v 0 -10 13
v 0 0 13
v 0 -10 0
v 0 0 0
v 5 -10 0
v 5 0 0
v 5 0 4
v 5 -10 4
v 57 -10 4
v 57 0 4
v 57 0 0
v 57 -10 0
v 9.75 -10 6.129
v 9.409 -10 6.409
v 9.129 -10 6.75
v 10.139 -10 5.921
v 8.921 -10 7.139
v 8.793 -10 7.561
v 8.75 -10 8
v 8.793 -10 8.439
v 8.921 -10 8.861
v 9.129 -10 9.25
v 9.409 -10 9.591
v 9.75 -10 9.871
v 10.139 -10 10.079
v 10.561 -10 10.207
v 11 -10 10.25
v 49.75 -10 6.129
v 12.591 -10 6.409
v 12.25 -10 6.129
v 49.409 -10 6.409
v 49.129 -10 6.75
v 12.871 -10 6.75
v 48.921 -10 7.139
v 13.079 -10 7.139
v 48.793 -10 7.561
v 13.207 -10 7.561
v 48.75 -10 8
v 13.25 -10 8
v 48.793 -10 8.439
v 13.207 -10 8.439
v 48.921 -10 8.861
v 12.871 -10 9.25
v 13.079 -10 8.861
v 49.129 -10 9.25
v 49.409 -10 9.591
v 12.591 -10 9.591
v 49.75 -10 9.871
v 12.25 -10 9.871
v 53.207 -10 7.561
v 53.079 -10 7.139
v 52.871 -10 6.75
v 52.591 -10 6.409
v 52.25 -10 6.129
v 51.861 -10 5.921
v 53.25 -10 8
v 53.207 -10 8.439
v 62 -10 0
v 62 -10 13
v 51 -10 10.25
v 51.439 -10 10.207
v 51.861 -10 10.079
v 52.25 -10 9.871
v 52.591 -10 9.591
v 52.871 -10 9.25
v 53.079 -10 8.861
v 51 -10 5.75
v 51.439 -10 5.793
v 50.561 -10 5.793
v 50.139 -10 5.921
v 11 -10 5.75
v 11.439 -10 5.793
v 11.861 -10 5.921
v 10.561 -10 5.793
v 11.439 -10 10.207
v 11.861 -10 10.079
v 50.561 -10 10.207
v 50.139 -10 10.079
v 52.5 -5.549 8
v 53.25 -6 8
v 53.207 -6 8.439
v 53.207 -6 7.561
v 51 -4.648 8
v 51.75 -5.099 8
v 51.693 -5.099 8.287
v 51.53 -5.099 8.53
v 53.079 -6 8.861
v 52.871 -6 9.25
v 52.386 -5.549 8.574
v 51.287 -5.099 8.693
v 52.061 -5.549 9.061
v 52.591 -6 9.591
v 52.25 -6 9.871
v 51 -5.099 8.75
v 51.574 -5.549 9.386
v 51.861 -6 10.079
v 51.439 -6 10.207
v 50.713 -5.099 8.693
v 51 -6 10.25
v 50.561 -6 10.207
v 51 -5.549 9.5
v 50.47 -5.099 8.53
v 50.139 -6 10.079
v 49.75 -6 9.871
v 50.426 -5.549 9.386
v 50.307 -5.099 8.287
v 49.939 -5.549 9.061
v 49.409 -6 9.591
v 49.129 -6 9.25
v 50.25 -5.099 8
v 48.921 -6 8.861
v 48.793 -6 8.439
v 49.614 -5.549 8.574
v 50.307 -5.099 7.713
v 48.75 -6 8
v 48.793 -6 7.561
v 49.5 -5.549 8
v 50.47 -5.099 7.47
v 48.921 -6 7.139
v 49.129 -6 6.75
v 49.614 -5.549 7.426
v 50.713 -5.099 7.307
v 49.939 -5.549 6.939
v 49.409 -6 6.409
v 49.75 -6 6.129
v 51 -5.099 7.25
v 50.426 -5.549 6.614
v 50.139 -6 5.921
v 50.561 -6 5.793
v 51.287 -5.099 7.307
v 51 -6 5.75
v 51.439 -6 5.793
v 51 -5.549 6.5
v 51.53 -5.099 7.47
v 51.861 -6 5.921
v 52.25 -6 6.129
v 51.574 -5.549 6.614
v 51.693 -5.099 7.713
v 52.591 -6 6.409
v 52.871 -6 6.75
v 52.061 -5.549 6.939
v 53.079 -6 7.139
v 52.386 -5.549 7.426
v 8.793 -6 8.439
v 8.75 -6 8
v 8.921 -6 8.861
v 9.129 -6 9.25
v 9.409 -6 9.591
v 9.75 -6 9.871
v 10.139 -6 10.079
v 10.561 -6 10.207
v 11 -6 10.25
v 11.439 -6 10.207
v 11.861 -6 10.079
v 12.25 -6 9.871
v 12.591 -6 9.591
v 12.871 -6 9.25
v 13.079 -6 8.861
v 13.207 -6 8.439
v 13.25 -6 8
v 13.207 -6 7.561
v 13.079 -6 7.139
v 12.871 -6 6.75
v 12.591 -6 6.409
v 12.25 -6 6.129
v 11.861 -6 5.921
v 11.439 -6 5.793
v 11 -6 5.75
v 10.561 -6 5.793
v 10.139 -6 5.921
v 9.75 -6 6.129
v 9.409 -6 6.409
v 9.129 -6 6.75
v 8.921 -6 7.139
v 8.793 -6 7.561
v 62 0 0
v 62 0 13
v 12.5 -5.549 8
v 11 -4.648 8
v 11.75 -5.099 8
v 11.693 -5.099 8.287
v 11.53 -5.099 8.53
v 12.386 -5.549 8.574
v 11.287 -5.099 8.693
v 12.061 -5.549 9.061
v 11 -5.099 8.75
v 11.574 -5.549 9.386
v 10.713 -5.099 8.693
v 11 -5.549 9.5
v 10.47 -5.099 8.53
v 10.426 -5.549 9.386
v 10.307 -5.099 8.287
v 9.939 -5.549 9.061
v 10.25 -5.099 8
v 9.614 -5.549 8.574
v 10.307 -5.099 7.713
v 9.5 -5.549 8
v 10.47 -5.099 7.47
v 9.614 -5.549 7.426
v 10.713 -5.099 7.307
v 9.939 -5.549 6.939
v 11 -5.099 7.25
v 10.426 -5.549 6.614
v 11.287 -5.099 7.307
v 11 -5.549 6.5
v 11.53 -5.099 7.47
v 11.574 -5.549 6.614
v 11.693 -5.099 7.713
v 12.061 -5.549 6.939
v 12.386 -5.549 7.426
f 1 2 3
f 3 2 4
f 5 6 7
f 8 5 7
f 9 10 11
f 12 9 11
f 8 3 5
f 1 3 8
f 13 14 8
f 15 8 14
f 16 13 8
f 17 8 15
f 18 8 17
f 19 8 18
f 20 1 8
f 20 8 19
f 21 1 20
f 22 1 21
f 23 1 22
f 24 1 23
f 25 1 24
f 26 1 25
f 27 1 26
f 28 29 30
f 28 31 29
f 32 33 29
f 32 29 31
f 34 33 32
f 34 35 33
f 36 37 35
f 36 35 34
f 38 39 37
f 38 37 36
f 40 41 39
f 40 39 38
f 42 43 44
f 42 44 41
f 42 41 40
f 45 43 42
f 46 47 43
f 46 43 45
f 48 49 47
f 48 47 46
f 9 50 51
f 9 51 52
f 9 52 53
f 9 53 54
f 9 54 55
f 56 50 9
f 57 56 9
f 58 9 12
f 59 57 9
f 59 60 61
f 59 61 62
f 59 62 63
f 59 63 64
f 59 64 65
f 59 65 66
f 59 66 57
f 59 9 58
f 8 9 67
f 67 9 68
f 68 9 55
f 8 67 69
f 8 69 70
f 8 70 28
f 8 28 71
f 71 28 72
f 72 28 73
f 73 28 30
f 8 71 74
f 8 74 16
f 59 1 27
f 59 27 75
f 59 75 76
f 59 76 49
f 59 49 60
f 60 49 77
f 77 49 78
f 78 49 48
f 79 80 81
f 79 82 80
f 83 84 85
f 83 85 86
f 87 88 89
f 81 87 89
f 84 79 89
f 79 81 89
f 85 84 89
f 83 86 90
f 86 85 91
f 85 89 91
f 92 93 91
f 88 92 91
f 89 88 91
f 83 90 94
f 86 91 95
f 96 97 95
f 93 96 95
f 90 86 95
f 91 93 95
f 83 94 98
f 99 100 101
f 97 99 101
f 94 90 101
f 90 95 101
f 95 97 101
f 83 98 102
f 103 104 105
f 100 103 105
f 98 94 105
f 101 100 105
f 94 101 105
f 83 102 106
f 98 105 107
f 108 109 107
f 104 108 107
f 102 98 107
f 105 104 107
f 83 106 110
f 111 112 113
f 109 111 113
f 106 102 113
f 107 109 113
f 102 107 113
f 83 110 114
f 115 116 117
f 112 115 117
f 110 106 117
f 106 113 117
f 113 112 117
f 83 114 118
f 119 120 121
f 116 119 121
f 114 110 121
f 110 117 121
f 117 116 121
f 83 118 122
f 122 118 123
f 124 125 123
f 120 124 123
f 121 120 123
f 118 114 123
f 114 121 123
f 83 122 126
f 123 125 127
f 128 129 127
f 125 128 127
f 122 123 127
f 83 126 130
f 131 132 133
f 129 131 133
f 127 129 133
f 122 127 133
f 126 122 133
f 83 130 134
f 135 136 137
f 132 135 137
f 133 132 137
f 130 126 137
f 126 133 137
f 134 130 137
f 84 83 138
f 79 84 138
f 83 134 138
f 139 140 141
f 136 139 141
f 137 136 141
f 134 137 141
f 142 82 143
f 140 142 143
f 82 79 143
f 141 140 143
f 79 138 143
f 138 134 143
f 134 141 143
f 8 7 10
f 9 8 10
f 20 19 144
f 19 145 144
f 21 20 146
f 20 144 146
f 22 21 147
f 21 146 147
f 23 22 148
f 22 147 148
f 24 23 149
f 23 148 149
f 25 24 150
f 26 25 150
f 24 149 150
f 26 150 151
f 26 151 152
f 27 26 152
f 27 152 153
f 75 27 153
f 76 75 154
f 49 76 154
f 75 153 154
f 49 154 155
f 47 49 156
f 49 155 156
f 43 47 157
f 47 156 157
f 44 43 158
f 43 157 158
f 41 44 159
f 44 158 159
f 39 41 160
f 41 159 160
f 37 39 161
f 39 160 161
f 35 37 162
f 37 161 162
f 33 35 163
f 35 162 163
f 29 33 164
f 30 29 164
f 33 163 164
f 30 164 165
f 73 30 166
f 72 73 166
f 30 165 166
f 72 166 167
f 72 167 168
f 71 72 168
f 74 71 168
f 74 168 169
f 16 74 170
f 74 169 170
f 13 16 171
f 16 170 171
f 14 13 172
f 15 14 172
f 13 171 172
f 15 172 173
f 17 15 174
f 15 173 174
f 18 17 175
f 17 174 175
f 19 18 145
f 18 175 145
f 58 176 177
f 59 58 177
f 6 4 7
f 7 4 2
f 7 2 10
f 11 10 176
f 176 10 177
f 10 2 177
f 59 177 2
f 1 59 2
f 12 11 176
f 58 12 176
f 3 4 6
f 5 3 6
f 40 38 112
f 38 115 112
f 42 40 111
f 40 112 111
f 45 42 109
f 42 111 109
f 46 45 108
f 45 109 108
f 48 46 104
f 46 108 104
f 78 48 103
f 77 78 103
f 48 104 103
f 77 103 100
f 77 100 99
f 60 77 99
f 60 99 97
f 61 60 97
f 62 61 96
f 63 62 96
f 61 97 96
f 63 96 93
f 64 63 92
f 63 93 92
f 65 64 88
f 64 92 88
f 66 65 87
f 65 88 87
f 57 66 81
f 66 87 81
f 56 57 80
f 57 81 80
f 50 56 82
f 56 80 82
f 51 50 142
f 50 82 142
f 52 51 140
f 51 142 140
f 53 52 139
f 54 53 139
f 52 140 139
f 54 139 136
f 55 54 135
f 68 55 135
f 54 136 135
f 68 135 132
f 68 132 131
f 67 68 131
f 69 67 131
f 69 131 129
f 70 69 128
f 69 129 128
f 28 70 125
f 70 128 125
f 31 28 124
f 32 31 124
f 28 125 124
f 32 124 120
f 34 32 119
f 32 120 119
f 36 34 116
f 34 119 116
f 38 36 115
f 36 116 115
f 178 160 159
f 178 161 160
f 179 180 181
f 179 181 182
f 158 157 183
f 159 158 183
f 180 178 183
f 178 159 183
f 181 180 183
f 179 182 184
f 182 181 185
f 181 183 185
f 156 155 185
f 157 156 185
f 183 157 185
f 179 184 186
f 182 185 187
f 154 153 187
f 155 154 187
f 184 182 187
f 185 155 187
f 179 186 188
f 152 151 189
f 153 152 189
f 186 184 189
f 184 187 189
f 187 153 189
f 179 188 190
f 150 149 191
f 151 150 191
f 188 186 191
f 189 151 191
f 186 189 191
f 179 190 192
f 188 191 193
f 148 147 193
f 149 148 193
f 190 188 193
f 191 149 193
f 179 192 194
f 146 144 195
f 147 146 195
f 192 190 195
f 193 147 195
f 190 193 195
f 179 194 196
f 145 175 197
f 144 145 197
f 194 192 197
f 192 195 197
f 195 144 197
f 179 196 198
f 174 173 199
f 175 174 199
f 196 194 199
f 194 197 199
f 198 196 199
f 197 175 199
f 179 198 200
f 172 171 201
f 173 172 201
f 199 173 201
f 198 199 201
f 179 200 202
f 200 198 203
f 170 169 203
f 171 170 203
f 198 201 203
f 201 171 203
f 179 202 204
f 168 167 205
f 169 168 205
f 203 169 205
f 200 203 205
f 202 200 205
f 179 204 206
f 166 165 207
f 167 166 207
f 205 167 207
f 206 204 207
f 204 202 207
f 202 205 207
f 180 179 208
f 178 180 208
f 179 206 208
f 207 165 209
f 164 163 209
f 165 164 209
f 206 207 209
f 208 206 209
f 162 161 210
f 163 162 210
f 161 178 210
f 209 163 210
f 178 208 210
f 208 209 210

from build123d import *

# Parameters (mm, degrees)
F1_DEPTH = 10
F3_D     = 4.5
F3_DEPTH = 4
F3_TIP   = 1.3519363928


with BuildPart() as f1:
    # F0 (on Front) → F1 (new body)
    with BuildSketch(Plane.XZ):
        Polygon((0, 13), (0, 0), (5, 0), (5, 4), (57, 4), (57, 0), (62, 0), (62, 13), align=None)
    extrude(amount=F1_DEPTH)

    # F3
    with Locations(Plane.XZ.offset(10)):
        with Locations((11, 8), (51, 8)):
            Hole(F3_D / 2, depth=F3_DEPTH)
            with Locations((0, 0, -(F3_DEPTH + F3_TIP / 2))):  # 118° drill point
                Cone(0, F3_D / 2, F3_TIP, mode=Mode.SUBTRACT)


solid = f1.part
